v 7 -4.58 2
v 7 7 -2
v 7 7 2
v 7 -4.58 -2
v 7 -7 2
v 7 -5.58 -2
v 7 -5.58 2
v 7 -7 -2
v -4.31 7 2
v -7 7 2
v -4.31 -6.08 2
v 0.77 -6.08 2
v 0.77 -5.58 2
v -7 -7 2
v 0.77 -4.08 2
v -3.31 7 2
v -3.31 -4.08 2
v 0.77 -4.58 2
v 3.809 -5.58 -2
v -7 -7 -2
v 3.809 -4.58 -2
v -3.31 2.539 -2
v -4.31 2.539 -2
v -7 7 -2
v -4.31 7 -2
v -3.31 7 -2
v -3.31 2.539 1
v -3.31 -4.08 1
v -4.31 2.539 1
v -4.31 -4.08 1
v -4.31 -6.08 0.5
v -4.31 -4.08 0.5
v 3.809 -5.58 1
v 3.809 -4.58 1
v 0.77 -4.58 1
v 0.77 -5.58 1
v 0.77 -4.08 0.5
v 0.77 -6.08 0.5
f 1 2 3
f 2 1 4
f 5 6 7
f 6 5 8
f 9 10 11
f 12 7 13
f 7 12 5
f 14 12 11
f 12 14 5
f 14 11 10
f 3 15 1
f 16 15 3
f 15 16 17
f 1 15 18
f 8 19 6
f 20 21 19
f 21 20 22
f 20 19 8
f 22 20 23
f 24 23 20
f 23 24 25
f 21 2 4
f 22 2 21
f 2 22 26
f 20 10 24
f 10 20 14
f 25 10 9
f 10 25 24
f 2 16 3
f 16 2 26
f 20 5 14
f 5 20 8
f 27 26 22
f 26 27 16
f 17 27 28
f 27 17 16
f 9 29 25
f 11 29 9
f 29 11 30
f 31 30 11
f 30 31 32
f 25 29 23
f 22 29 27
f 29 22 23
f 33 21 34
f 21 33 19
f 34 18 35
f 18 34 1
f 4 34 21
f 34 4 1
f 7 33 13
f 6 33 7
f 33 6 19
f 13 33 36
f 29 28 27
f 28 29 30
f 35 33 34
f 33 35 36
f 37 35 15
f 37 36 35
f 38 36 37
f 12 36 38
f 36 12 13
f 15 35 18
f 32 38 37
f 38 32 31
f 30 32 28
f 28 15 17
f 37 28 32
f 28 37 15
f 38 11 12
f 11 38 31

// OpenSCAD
// file: parameters.scad
/* [PCB Properties] */
// Diameter of row/column wire channels
wire_diameter = 2.15;
// Upward angle of switch pin in contact with diode anode (gives more reliable
// connections but slightly deforms pin)
diode_pin_angle = 5;  // [0:15]
// Diameter of standoff hole
standoff_hole_diameter = 3;
// Overall thickness of PCB
thickness = 4;


/* [Advanced Values (related to switch size)] */
// Switch spacing distance
unit = 19.05;
// Size of socket body
socket_size = 14;
// Depth of the socket holes
socket_depth = 3.5;
// Spacing of grid for pins
grid = 1.27;
// Resolution of holes (affects render times)
$fn=12;

module __Customizer_Limit__ () {}
// main file
include <parameters.scad>

difference() {
    cube([socket_size, socket_size, thickness], center=true);
        
    translate([-3*grid,2*grid,0])
        translate([0,socket_size/2-0.001,0])
            cube([1,socket_size,thickness+1],center=true);
    translate([3*grid,-4*grid,0])
        translate([socket_size/2-0.001,0,0])
            cube([socket_size,1,thickness+1],center=true);

    // Diode Channel
    translate([-3*grid,-1*grid-.25,thickness/2])
        cube([1,6*grid+.5,2],center=true);
    translate([0,-4*grid,thickness/2])
        cube([6*grid,1,2],center=true);
    translate([-1*grid-.5,-4*grid,thickness/2])
        cube([4*grid,2,3],center=true);
}
